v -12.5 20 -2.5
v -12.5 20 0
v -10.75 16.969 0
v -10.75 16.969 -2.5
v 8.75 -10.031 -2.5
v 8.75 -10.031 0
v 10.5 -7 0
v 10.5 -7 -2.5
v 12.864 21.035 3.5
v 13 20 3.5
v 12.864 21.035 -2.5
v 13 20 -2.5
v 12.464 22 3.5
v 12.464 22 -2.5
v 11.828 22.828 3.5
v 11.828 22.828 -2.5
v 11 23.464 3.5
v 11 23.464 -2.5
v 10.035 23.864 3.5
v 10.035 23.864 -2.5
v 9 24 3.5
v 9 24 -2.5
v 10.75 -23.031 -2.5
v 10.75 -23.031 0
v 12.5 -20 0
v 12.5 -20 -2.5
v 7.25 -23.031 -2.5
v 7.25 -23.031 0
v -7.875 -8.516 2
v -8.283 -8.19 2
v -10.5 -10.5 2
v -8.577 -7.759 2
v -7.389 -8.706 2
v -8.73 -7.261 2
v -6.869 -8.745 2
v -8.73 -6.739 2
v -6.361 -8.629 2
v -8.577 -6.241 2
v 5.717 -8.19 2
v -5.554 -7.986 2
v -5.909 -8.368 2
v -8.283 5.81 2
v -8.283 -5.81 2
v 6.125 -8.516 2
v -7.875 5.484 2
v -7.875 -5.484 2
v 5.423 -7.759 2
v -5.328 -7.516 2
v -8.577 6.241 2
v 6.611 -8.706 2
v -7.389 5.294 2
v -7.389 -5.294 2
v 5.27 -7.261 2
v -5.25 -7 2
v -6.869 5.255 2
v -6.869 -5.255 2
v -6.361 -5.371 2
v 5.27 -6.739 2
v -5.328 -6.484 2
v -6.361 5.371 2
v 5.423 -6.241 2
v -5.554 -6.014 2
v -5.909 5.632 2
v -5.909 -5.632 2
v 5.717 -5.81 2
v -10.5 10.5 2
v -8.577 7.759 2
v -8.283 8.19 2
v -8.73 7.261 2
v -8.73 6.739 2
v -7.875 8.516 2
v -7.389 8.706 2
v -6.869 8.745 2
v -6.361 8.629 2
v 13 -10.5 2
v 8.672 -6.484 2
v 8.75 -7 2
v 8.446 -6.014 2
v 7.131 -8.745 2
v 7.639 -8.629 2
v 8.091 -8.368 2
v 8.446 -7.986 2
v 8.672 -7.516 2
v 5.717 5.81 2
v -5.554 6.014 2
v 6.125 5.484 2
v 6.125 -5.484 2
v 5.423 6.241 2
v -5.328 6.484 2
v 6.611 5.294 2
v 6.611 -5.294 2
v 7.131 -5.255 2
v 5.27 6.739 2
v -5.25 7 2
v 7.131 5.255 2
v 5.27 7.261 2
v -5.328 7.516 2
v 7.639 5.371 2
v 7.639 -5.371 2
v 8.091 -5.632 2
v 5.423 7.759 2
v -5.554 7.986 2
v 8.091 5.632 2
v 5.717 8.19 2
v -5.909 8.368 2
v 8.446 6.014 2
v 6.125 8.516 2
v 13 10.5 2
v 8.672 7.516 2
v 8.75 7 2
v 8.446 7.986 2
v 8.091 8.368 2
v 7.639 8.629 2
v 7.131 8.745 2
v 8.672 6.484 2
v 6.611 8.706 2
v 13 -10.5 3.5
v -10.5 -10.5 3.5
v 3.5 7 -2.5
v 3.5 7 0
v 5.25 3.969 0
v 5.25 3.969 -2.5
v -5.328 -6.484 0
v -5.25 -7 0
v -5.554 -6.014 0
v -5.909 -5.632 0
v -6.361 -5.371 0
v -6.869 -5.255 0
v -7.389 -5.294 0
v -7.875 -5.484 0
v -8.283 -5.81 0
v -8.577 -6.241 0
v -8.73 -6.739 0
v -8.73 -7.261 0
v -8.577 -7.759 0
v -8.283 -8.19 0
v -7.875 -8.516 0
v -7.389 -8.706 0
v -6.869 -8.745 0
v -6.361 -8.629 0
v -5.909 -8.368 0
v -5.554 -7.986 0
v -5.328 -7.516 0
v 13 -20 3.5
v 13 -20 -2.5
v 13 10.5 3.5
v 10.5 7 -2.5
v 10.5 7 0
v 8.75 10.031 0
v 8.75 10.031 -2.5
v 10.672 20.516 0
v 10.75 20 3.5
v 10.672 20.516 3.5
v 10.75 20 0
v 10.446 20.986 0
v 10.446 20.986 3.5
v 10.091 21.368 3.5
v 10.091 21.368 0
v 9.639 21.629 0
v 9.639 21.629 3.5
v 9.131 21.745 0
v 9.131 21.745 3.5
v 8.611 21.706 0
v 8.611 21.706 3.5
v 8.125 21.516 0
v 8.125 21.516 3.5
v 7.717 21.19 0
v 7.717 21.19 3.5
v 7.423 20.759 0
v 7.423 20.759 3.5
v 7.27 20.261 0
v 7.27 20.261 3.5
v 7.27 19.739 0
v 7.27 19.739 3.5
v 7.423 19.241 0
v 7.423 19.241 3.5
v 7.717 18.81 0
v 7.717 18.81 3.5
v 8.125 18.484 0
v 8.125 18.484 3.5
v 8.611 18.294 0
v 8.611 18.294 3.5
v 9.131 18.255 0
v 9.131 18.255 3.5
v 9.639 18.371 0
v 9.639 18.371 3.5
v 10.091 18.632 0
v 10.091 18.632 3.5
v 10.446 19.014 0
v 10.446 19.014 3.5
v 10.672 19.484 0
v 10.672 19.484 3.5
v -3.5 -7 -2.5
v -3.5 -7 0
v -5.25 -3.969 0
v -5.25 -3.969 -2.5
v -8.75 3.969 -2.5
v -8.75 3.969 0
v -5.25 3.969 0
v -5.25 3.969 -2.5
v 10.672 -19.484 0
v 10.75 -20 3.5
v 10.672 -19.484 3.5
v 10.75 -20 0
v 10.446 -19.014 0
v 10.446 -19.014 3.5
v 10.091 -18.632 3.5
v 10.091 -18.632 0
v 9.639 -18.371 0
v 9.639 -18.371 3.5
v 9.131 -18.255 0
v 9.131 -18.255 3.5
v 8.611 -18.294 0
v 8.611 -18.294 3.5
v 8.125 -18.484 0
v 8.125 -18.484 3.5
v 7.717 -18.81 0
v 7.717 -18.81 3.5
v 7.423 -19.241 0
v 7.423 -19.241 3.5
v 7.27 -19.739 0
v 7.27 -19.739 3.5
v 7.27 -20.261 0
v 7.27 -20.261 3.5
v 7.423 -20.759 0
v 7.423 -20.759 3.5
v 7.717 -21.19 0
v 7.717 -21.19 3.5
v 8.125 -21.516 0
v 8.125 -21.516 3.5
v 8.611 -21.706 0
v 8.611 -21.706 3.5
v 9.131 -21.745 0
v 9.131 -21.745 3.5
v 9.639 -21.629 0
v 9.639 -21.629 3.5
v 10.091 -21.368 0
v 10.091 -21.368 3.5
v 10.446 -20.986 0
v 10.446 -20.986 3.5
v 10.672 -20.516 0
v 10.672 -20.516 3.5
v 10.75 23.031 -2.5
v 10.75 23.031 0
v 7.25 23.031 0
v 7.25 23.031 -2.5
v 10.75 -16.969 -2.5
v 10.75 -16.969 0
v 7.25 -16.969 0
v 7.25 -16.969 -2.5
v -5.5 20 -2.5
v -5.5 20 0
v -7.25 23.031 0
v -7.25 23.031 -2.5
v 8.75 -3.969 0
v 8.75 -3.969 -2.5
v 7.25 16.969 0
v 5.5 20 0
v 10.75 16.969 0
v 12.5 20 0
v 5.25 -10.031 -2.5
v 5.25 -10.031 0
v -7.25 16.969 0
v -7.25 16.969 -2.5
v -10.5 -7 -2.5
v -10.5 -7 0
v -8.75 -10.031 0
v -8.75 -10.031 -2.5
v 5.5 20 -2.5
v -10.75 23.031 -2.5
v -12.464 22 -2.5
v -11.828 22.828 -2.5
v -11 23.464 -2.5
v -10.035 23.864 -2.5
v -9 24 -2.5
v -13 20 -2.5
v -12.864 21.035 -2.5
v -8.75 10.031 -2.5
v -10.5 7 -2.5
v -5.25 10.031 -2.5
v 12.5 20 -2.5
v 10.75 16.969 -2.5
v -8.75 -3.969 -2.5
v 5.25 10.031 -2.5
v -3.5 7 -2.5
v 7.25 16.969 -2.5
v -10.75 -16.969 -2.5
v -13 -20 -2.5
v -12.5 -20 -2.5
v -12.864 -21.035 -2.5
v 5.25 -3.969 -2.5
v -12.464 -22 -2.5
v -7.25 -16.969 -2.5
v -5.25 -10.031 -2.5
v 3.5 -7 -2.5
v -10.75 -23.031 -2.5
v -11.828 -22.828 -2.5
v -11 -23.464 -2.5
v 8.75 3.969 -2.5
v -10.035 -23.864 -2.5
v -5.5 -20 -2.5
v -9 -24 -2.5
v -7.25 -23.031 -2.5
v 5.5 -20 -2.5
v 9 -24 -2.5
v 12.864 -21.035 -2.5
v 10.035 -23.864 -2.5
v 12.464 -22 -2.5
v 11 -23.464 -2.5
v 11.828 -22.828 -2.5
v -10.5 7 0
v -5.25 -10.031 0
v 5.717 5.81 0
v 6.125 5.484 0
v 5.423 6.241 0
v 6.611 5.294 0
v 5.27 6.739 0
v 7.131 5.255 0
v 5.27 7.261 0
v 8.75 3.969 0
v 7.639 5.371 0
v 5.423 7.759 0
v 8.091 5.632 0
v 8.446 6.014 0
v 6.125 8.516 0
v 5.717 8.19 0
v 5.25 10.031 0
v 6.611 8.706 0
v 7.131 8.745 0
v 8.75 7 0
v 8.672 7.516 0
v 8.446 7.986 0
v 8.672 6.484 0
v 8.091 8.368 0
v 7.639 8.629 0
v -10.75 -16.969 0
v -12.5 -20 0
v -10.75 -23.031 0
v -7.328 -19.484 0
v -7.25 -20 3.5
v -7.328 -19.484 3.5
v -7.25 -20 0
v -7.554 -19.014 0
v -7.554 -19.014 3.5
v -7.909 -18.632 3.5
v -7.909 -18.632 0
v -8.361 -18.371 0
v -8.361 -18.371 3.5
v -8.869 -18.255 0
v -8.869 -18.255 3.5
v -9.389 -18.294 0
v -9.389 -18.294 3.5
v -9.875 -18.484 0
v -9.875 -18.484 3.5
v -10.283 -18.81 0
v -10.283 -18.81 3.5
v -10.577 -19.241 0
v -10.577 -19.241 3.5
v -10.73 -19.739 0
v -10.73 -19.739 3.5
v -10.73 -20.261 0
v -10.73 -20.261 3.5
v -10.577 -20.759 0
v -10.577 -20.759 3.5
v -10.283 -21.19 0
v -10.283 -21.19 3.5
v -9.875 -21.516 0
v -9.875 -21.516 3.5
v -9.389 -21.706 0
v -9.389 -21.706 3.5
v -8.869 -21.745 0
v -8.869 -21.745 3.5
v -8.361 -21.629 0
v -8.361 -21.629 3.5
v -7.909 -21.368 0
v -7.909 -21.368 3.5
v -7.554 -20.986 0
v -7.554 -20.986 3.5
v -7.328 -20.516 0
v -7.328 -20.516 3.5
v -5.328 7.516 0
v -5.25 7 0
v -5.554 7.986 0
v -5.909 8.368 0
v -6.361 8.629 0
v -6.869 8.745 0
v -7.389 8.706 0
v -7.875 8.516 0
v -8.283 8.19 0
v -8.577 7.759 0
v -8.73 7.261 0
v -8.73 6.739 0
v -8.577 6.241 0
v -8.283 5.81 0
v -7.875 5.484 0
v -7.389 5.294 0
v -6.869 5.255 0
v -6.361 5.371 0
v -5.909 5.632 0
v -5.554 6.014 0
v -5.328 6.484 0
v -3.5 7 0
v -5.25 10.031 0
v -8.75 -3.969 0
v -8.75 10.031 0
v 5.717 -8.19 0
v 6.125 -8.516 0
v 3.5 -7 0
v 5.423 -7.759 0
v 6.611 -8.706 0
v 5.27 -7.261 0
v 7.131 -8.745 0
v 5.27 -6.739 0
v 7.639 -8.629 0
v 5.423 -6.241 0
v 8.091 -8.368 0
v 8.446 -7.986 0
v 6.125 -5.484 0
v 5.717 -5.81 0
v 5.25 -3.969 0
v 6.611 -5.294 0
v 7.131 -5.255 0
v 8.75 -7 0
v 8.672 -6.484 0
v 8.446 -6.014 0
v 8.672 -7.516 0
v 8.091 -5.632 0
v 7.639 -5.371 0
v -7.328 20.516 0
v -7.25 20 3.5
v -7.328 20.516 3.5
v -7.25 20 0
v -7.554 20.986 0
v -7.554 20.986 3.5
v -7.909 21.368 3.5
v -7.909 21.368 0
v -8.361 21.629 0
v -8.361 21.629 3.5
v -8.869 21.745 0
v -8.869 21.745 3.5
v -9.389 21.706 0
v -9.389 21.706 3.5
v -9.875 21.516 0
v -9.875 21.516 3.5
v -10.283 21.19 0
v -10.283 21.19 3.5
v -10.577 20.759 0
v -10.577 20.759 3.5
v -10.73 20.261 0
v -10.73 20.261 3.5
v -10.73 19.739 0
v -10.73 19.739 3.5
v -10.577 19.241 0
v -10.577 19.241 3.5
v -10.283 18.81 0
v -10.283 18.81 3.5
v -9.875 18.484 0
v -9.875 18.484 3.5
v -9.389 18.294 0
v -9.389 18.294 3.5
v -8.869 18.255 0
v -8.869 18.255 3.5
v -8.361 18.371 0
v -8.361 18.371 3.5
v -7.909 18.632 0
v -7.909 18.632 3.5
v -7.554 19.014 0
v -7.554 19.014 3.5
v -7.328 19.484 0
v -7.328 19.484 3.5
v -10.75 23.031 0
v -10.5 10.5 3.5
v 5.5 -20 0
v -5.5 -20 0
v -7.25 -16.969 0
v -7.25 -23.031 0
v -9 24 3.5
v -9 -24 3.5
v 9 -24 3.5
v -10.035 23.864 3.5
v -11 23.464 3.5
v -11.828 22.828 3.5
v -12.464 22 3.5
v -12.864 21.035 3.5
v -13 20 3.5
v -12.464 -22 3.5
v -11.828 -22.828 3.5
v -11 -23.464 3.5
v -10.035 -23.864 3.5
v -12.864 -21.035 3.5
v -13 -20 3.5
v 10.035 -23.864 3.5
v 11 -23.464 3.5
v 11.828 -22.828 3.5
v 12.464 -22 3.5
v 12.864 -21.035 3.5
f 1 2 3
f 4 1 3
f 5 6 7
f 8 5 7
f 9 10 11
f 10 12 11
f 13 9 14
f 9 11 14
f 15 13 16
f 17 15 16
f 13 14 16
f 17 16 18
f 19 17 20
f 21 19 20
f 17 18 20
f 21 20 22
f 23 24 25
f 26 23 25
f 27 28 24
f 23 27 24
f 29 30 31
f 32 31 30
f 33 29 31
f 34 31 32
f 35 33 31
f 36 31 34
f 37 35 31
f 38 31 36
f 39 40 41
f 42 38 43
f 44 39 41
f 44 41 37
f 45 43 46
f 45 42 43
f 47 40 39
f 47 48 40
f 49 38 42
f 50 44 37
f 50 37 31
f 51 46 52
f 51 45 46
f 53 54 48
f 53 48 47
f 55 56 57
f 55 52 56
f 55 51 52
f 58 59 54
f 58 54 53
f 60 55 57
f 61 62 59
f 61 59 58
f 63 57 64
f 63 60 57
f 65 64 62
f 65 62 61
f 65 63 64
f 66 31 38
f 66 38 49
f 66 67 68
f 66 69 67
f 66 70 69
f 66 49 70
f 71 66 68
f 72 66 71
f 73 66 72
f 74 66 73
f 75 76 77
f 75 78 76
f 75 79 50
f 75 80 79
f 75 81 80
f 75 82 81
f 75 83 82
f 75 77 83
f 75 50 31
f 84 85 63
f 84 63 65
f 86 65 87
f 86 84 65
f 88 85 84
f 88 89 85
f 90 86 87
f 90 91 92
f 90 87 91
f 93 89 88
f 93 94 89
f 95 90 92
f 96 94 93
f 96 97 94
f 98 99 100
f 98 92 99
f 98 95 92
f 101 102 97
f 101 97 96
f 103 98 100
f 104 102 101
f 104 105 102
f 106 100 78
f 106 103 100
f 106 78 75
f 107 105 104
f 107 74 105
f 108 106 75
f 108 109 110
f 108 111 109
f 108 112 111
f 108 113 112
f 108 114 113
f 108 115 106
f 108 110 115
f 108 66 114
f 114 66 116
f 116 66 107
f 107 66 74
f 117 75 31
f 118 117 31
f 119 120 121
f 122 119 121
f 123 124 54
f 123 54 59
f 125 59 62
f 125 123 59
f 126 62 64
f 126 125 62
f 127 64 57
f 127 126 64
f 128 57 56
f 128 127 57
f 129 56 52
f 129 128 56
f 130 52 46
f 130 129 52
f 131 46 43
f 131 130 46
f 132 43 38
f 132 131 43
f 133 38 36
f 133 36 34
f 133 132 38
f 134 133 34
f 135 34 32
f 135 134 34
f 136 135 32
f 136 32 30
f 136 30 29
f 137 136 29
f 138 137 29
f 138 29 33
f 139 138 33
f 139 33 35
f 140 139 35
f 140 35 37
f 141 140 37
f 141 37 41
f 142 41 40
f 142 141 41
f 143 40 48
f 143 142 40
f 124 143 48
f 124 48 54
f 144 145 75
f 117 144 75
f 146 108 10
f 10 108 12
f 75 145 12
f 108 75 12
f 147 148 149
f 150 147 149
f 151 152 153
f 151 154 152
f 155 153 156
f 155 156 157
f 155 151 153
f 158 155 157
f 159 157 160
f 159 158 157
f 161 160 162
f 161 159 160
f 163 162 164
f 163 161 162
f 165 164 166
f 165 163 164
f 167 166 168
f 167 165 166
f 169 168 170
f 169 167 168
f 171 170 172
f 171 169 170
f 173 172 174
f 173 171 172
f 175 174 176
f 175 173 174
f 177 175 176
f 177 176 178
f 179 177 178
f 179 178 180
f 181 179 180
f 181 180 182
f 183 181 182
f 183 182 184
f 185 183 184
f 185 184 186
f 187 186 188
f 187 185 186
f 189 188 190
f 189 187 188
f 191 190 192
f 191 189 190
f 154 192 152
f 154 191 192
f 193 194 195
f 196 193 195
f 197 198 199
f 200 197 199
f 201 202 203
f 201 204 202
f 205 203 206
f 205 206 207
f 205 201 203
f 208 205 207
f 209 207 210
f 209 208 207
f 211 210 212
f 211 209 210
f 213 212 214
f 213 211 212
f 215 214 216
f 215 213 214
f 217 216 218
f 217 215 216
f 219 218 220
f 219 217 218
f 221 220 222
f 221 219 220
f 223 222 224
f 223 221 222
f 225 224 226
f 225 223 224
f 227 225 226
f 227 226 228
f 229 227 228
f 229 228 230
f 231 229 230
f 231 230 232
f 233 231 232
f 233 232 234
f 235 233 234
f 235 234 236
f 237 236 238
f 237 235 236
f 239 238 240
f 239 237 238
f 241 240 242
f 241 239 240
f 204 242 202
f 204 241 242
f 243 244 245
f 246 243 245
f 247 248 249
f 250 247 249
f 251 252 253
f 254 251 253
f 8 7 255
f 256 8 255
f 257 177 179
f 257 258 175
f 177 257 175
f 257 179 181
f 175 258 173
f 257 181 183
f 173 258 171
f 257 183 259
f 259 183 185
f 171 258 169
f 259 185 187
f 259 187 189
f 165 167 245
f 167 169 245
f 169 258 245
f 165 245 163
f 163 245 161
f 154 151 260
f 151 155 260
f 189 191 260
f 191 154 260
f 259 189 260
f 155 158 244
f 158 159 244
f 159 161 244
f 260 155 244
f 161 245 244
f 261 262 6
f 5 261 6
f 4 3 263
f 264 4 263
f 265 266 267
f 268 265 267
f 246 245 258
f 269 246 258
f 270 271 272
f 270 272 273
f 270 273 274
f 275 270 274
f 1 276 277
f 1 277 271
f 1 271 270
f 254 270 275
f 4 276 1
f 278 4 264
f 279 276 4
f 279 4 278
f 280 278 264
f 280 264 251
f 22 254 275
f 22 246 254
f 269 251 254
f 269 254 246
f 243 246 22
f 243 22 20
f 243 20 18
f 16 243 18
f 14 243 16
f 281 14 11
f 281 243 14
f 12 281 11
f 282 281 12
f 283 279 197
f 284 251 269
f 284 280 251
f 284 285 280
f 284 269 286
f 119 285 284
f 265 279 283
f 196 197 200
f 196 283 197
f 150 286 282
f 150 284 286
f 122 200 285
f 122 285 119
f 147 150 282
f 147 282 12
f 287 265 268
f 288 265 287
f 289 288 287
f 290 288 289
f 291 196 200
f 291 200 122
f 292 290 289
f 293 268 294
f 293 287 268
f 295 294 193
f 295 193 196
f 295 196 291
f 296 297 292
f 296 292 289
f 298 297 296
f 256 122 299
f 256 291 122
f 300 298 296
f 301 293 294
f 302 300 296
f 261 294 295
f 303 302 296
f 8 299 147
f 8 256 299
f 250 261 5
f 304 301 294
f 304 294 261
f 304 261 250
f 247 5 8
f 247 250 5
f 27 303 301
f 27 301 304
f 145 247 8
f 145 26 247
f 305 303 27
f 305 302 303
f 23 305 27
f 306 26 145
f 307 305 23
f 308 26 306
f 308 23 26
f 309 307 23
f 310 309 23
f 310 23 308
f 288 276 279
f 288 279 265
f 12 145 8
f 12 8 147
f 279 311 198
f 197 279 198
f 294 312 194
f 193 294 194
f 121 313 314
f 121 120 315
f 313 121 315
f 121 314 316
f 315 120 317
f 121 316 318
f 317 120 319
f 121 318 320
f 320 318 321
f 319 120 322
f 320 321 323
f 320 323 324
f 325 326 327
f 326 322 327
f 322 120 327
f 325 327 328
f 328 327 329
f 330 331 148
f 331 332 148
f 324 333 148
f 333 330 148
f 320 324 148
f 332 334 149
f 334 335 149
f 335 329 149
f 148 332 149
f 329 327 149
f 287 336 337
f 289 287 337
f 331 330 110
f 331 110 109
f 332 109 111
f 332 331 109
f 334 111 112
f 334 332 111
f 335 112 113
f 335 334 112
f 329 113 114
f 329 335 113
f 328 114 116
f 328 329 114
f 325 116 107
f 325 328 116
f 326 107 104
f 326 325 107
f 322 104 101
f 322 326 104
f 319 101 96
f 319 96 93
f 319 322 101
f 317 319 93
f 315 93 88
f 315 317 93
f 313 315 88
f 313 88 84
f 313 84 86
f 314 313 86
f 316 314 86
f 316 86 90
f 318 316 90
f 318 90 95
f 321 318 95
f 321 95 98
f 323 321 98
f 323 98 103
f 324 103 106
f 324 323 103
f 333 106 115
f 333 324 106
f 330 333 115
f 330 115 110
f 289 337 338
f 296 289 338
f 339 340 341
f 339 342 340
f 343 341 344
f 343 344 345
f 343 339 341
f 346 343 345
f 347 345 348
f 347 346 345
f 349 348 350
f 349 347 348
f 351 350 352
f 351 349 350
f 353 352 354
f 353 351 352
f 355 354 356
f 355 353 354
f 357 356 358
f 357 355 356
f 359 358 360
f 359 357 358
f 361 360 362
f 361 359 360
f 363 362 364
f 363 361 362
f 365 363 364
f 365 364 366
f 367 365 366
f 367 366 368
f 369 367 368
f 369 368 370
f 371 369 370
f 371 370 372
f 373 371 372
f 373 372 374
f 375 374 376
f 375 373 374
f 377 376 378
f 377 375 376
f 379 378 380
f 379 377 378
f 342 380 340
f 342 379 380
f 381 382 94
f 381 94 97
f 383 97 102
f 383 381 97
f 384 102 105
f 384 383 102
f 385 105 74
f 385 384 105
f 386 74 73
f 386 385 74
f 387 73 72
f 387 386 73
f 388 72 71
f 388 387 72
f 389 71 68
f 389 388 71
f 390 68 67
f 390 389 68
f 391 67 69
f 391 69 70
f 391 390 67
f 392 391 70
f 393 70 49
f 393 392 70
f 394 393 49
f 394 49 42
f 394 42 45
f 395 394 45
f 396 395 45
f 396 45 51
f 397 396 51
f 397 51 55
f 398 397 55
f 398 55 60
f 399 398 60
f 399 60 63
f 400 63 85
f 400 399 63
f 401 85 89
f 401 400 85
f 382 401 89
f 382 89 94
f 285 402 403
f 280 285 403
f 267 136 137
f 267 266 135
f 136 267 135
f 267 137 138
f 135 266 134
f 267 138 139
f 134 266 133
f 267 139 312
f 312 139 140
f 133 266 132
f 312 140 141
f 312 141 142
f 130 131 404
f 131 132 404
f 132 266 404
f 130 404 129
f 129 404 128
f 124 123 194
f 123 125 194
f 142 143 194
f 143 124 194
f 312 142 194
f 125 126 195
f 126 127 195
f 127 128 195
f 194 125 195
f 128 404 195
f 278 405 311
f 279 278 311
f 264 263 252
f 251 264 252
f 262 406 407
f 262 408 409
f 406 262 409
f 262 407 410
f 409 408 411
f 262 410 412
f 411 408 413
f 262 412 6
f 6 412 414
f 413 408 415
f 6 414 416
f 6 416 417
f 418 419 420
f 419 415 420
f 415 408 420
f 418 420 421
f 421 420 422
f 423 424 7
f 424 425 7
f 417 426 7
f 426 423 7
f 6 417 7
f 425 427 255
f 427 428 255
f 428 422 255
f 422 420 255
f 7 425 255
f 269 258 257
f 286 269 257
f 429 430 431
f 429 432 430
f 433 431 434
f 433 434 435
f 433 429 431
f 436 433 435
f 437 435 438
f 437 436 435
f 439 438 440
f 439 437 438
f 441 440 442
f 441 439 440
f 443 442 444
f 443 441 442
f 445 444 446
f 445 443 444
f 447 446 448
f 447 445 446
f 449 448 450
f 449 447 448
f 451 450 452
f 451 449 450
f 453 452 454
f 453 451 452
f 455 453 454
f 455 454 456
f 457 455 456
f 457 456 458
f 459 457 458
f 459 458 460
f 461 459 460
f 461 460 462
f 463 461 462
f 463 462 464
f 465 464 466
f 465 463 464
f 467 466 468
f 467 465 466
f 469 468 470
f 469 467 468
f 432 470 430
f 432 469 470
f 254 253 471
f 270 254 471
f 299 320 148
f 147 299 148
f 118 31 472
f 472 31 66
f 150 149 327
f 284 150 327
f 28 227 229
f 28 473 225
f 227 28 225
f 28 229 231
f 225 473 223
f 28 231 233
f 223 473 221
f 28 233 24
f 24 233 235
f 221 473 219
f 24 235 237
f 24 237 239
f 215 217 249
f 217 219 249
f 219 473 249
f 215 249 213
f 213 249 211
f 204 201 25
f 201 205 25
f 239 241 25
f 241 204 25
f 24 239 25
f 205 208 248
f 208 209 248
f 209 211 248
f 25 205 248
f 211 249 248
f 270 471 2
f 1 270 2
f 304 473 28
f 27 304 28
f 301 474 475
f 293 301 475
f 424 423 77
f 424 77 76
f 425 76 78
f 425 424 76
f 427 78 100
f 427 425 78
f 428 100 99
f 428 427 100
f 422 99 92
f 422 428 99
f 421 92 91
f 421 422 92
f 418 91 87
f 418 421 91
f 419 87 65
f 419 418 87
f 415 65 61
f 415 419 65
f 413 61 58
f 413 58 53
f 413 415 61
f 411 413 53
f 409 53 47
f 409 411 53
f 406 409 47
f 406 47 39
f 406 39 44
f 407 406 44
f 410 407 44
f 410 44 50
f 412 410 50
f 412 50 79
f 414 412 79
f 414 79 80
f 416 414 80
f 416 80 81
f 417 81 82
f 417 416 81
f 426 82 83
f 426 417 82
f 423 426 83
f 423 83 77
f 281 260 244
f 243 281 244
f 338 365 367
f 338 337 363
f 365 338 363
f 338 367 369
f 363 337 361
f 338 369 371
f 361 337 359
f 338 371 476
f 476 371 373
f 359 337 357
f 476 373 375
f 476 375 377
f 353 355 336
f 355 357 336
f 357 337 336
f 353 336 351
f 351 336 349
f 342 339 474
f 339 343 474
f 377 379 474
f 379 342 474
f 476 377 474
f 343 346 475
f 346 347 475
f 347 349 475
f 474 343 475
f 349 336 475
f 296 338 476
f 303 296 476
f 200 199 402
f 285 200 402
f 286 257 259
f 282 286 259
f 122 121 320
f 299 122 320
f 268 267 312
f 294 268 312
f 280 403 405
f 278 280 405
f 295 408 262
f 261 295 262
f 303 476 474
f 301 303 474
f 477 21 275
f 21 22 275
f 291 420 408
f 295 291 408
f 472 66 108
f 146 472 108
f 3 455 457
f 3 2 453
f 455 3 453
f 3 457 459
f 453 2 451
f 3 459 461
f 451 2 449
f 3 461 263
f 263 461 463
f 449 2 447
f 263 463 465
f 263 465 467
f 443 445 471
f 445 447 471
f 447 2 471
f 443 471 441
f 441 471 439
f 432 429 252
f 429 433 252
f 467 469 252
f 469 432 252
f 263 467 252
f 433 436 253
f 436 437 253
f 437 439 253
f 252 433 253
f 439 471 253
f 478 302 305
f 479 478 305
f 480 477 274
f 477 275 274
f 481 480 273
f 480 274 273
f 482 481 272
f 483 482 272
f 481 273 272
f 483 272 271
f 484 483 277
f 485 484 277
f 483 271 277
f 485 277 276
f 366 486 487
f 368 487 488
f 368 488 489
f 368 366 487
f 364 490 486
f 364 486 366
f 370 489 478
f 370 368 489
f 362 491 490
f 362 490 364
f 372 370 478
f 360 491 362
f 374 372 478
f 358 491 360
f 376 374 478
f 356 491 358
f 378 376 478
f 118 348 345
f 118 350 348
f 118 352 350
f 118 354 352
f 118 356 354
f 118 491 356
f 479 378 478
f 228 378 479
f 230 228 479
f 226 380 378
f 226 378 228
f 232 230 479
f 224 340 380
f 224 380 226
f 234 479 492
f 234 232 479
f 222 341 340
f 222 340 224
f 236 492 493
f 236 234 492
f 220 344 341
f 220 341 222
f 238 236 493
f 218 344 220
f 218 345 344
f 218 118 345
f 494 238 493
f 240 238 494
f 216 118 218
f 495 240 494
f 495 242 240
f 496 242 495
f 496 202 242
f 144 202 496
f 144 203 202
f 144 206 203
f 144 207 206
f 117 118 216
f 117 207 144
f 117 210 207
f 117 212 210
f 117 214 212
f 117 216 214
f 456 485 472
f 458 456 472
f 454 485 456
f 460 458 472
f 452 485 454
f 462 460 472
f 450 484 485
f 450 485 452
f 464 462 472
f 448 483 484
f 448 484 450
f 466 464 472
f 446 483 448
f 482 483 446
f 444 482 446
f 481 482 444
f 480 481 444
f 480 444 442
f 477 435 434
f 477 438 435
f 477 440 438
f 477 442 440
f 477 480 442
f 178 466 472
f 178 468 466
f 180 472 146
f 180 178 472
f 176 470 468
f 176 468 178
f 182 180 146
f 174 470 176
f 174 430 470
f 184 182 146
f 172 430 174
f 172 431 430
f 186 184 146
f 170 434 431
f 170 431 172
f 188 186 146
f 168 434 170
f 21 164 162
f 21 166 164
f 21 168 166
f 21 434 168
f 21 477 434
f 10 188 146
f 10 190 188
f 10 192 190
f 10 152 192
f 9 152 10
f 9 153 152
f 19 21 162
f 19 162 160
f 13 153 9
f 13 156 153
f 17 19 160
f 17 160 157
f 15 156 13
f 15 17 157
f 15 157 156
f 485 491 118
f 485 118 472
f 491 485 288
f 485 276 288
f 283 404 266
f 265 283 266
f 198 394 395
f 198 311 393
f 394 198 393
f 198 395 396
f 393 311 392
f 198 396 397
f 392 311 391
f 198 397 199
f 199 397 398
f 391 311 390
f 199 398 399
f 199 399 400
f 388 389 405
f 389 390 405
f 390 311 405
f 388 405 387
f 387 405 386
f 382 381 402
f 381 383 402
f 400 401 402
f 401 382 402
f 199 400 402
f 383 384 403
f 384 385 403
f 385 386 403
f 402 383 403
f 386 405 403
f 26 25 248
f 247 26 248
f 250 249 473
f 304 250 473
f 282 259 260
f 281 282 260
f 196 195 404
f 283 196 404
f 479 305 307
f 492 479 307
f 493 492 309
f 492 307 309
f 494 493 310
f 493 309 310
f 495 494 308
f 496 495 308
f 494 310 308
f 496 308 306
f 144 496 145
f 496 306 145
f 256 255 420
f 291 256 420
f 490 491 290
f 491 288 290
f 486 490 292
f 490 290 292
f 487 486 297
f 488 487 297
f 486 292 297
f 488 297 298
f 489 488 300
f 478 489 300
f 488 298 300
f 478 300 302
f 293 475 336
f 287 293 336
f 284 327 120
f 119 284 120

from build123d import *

# Parameters (mm, degrees)
F0_R     = 1.75
F1_DEPTH = 2
F3_DEPTH = 2.5
F4_R     = 1.75
F5_DEPTH = 1.5


with BuildPart() as f1:
    # F0 (on Top) → F1 (new body)
    with BuildSketch(Plane.XY):
        with BuildLine():
            ThreePointArc((-9, -24), (-6.171573, -22.828427), (-5, -20))
            ThreePointArc((-5, -20), (-9, -16), (-13, -20))
            ThreePointArc((-13, -20), (-11.828427, -22.828427), (-9, -24))
        make_face()
        with Locations((-9, -20)):
            Circle(F0_R, mode=Mode.SUBTRACT)
        with BuildLine():
            ThreePointArc((-13, -20), (-9, -16), (-5, -20))
            ThreePointArc((-5, -20), (-6.171573, -22.828427), (-9, -24))
            Line((-9, -24), (9, -24))
            ThreePointArc((9, -24), (6.171573, -17.171573), (13, -20))
            Line((13, -20), (13, 20))
            ThreePointArc((13, 20), (6.171573, 17.171573), (9, 24))
            Line((9, 24), (-9, 24))
            ThreePointArc((-9, 24), (-6.171573, 22.828427), (-5, 20))
            ThreePointArc((-5, 20), (-9, 16), (-13, 20))
            Line((-13, 20), (-13, -20))
        make_face()
        with Locations((-7, -7)):
            Circle(F0_R, mode=Mode.SUBTRACT)
        with Locations((7, -7)):
            Circle(F0_R, mode=Mode.SUBTRACT)
        with Locations((-7, 7)):
            Circle(F0_R, mode=Mode.SUBTRACT)
        with Locations((7, 7)):
            Circle(F0_R, mode=Mode.SUBTRACT)
        with BuildLine():
            ThreePointArc((-9, 24), (-11.828427, 22.828427), (-13, 20))
            ThreePointArc((-13, 20), (-9, 16), (-5, 20))
            ThreePointArc((-5, 20), (-6.171573, 22.828427), (-9, 24))
        make_face()
        with Locations((-9, 20)):
            Circle(F0_R, mode=Mode.SUBTRACT)
        with BuildLine():
            ThreePointArc((13, -20), (6.171573, -17.171573), (9, -24))
            ThreePointArc((9, -24), (11.828427, -22.828427), (13, -20))
        make_face()
        with Locations((9, -20)):
            Circle(F0_R, mode=Mode.SUBTRACT)
        with BuildLine():
            ThreePointArc((13, 20), (11.828427, 22.828427), (9, 24))
            ThreePointArc((9, 24), (6.171573, 17.171573), (13, 20))
        make_face()
        with Locations((9, 20)):
            Circle(F0_R, mode=Mode.SUBTRACT)
    extrude(amount=F1_DEPTH)

    # F2 (on face) → F3 (join)
    with BuildSketch(Plane(origin=(0, 0, 0), x_dir=(1, 0, 0), z_dir=(0, 0, -1))):
        with BuildLine():
            ThreePointArc((-9, 24), (-11.828427, 22.828427), (-13, 20))
            Line((-13, 20), (-13, -20))
            ThreePointArc((-13, -20), (-11.828427, -22.828427), (-9, -24))
            Line((-9, -24), (9, -24))
            ThreePointArc((9, -24), (11.828427, -22.828427), (13, -20))
            Line((13, -20), (13, 20))
            ThreePointArc((13, 20), (11.828427, 22.828427), (9, 24))
            Line((9, 24), (-9, 24))
        make_face()
        Polygon((-7.25, -16.968911), (-5.5, -20), (-7.25, -23.031089), (-10.75, -23.031089), (-12.5, -20), (-10.75, -16.968911), align=None, mode=Mode.SUBTRACT)
        Polygon((-5.25, -3.968911), (-3.5, -7), (-5.25, -10.031089), (-8.75, -10.031089), (-10.5, -7), (-8.75, -3.968911), align=None, mode=Mode.SUBTRACT)
        Polygon((10.75, -16.968911), (12.5, -20), (10.75, -23.031089), (7.25, -23.031089), (5.5, -20), (7.25, -16.968911), align=None, mode=Mode.SUBTRACT)
        Polygon((8.75, -3.968911), (10.5, -7), (8.75, -10.031089), (5.25, -10.031089), (3.5, -7), (5.25, -3.968911), align=None, mode=Mode.SUBTRACT)
        Polygon((-8.75, 10.031089), (-5.25, 10.031089), (-3.5, 7), (-5.25, 3.968911), (-8.75, 3.968911), (-10.5, 7), align=None, mode=Mode.SUBTRACT)
        Polygon((-7.25, 23.031089), (-5.5, 20), (-7.25, 16.968911), (-10.75, 16.968911), (-12.5, 20), (-10.75, 23.031089), align=None, mode=Mode.SUBTRACT)
        Polygon((8.75, 10.031089), (10.5, 7), (8.75, 3.968911), (5.25, 3.968911), (3.5, 7), (5.25, 10.031089), align=None, mode=Mode.SUBTRACT)
        Polygon((7.25, 23.031089), (10.75, 23.031089), (12.5, 20), (10.75, 16.968911), (7.25, 16.968911), (5.5, 20), align=None, mode=Mode.SUBTRACT)
    extrude(amount=F3_DEPTH)

    # F4 (on face) → F5 (join)
    with BuildSketch(Plane.XY.offset(2)):
        with BuildLine():
            Line((-10.5, 10.5), (10.5, 10.5))
            Line((10.5, 10.5), (13, 10.5))
            Line((13, 10.5), (13, 20))
            ThreePointArc((13, 20), (11.828427, 22.828427), (9, 24))
            Line((9, 24), (-9, 24))
            ThreePointArc((-9, 24), (-11.828427, 22.828427), (-13, 20))
            Line((-13, 20), (-13, -20))
            ThreePointArc((-13, -20), (-11.828427, -22.828427), (-9, -24))
            Line((-9, -24), (9, -24))
            ThreePointArc((9, -24), (11.828427, -22.828427), (13, -20))
            Line((13, -20), (13, -10.5))
            Line((13, -10.5), (10.5, -10.5))
            Line((10.5, -10.5), (-10.5, -10.5))
            Line((-10.5, -10.5), (-10.5, 10.5))
        make_face()
        with Locations((-9, -20)):
            Circle(F4_R, mode=Mode.SUBTRACT)
        with Locations((9, -20)):
            Circle(F4_R, mode=Mode.SUBTRACT)
        with Locations((-9, 20)):
            Circle(F4_R, mode=Mode.SUBTRACT)
        with Locations((9, 20)):
            Circle(F4_R, mode=Mode.SUBTRACT)
    extrude(amount=F5_DEPTH)


solid = f1.part
